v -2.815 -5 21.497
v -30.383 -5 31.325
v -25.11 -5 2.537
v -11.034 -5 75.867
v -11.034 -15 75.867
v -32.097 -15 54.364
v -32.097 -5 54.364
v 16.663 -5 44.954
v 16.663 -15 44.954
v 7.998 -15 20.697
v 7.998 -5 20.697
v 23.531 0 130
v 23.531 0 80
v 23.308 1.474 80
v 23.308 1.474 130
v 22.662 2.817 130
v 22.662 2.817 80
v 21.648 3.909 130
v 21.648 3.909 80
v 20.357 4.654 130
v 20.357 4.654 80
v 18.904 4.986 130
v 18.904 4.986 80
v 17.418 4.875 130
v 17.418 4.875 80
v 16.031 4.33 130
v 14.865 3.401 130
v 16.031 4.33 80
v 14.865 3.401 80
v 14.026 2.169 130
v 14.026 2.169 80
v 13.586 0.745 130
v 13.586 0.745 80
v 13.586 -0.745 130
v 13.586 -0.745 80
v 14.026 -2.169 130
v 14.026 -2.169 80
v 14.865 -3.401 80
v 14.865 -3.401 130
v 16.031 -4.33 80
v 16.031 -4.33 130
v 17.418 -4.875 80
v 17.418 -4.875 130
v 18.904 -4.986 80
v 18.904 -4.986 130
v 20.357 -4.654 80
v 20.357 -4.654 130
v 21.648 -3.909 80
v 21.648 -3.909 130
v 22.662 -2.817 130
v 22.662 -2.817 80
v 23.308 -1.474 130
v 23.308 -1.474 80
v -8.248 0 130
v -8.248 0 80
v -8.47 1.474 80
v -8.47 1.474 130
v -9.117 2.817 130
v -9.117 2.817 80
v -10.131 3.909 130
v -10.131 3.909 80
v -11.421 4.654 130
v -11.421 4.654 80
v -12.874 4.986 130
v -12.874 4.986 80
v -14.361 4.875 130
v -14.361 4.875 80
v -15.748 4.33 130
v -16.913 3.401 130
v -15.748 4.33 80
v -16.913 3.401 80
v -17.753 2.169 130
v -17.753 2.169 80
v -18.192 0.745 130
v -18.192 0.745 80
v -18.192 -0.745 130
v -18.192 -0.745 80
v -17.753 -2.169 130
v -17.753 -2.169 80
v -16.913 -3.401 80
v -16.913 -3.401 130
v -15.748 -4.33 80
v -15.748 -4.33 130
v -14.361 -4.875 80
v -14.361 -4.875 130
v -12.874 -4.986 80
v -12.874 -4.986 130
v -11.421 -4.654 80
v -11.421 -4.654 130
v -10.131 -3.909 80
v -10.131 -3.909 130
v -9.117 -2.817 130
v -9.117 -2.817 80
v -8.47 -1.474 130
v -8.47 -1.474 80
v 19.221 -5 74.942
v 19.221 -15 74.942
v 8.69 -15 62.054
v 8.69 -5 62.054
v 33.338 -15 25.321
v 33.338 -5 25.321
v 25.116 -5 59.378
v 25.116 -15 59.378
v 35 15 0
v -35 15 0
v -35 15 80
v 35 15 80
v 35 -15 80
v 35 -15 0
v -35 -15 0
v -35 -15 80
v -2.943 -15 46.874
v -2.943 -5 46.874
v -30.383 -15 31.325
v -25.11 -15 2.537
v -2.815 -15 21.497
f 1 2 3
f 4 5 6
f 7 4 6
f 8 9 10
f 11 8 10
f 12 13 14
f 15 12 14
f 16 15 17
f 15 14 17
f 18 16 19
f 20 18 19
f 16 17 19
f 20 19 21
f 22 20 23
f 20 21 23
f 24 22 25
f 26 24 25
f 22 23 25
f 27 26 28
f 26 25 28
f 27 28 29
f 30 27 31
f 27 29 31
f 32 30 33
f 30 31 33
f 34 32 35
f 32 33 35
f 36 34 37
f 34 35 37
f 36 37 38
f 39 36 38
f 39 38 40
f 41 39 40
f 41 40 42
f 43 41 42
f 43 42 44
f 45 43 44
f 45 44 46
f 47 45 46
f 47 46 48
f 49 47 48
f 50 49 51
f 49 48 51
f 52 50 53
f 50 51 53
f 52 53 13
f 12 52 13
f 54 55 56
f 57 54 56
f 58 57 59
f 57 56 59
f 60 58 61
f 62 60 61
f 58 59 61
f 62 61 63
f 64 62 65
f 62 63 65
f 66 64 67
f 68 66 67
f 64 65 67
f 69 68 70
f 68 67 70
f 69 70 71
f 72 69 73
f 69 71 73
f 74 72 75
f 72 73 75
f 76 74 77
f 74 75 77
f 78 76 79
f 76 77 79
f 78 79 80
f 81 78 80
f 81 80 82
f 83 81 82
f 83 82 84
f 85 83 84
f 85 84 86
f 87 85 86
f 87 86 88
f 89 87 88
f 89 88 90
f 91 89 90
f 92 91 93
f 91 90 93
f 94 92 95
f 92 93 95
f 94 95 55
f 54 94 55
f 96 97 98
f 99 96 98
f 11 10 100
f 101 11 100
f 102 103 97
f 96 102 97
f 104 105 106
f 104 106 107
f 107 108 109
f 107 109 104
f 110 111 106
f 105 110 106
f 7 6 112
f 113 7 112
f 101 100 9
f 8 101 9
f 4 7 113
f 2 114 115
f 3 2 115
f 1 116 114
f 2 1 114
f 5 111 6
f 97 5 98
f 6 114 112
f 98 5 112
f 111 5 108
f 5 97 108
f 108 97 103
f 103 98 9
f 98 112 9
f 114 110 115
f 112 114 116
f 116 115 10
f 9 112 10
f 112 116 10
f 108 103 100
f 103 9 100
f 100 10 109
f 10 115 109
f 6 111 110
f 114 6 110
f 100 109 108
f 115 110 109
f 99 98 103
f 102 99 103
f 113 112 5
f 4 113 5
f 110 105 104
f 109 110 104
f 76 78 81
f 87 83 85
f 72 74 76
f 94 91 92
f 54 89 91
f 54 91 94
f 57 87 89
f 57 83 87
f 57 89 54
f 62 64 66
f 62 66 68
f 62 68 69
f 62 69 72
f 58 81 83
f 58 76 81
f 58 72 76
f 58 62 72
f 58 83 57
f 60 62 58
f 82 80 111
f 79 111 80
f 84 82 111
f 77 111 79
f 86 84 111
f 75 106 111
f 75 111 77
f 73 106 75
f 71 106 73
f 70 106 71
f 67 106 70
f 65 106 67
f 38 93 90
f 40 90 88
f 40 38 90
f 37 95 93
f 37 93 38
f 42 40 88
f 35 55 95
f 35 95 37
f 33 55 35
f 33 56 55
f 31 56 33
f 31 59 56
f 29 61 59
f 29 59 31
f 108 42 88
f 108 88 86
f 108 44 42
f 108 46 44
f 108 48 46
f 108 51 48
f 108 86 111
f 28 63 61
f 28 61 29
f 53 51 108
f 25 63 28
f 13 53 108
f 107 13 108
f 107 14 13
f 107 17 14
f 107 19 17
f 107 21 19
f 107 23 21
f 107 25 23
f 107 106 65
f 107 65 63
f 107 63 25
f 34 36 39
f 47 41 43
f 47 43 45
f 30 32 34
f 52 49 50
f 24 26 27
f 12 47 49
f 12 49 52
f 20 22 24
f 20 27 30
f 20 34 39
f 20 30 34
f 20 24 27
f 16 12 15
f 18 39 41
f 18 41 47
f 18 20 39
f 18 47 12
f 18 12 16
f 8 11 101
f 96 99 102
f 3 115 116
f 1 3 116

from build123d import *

# Parameters (mm, degrees)
F0_W     = 70
F0_H     = 30
F1_DEPTH = 80
F2_R     = 5
F3_DEPTH = 50
F5_DEPTH = 10


with BuildPart() as f1:
    # F0 (on Top) → F1 (new body)
    with BuildSketch(Plane.XY):
        Rectangle(F0_W, F0_H)
    extrude(amount=F1_DEPTH)

    # F2 (on face) → F3 (join)
    with BuildSketch(Plane.XY.offset(80)):
        with Locations((-13.248, 0)):
            Circle(F2_R)
        with Locations((18.53054, 0)):
            Circle(F2_R)
    extrude(amount=F3_DEPTH)

    # F4 (on face) → F5 (cut)
    with BuildSketch(Plane.XZ.offset(15)):
        Polygon((8.690138, 62.054458), (25.116485, 59.377786), (19.221377, 74.941756), align=None)
        Polygon((-2.943005, 46.873943), (-11.033713, 75.867229), (-32.097282, 54.363828), align=None)
        Polygon((-25.11046, 2.536608), (-2.81477, 21.49697), (-30.38277, 31.325422), align=None)
        Polygon((33.337645, 25.32119), (16.663238, 44.953783), (7.998117, 20.697027), align=None)
    extrude(amount=-F5_DEPTH, mode=Mode.SUBTRACT)


solid = f1.part
